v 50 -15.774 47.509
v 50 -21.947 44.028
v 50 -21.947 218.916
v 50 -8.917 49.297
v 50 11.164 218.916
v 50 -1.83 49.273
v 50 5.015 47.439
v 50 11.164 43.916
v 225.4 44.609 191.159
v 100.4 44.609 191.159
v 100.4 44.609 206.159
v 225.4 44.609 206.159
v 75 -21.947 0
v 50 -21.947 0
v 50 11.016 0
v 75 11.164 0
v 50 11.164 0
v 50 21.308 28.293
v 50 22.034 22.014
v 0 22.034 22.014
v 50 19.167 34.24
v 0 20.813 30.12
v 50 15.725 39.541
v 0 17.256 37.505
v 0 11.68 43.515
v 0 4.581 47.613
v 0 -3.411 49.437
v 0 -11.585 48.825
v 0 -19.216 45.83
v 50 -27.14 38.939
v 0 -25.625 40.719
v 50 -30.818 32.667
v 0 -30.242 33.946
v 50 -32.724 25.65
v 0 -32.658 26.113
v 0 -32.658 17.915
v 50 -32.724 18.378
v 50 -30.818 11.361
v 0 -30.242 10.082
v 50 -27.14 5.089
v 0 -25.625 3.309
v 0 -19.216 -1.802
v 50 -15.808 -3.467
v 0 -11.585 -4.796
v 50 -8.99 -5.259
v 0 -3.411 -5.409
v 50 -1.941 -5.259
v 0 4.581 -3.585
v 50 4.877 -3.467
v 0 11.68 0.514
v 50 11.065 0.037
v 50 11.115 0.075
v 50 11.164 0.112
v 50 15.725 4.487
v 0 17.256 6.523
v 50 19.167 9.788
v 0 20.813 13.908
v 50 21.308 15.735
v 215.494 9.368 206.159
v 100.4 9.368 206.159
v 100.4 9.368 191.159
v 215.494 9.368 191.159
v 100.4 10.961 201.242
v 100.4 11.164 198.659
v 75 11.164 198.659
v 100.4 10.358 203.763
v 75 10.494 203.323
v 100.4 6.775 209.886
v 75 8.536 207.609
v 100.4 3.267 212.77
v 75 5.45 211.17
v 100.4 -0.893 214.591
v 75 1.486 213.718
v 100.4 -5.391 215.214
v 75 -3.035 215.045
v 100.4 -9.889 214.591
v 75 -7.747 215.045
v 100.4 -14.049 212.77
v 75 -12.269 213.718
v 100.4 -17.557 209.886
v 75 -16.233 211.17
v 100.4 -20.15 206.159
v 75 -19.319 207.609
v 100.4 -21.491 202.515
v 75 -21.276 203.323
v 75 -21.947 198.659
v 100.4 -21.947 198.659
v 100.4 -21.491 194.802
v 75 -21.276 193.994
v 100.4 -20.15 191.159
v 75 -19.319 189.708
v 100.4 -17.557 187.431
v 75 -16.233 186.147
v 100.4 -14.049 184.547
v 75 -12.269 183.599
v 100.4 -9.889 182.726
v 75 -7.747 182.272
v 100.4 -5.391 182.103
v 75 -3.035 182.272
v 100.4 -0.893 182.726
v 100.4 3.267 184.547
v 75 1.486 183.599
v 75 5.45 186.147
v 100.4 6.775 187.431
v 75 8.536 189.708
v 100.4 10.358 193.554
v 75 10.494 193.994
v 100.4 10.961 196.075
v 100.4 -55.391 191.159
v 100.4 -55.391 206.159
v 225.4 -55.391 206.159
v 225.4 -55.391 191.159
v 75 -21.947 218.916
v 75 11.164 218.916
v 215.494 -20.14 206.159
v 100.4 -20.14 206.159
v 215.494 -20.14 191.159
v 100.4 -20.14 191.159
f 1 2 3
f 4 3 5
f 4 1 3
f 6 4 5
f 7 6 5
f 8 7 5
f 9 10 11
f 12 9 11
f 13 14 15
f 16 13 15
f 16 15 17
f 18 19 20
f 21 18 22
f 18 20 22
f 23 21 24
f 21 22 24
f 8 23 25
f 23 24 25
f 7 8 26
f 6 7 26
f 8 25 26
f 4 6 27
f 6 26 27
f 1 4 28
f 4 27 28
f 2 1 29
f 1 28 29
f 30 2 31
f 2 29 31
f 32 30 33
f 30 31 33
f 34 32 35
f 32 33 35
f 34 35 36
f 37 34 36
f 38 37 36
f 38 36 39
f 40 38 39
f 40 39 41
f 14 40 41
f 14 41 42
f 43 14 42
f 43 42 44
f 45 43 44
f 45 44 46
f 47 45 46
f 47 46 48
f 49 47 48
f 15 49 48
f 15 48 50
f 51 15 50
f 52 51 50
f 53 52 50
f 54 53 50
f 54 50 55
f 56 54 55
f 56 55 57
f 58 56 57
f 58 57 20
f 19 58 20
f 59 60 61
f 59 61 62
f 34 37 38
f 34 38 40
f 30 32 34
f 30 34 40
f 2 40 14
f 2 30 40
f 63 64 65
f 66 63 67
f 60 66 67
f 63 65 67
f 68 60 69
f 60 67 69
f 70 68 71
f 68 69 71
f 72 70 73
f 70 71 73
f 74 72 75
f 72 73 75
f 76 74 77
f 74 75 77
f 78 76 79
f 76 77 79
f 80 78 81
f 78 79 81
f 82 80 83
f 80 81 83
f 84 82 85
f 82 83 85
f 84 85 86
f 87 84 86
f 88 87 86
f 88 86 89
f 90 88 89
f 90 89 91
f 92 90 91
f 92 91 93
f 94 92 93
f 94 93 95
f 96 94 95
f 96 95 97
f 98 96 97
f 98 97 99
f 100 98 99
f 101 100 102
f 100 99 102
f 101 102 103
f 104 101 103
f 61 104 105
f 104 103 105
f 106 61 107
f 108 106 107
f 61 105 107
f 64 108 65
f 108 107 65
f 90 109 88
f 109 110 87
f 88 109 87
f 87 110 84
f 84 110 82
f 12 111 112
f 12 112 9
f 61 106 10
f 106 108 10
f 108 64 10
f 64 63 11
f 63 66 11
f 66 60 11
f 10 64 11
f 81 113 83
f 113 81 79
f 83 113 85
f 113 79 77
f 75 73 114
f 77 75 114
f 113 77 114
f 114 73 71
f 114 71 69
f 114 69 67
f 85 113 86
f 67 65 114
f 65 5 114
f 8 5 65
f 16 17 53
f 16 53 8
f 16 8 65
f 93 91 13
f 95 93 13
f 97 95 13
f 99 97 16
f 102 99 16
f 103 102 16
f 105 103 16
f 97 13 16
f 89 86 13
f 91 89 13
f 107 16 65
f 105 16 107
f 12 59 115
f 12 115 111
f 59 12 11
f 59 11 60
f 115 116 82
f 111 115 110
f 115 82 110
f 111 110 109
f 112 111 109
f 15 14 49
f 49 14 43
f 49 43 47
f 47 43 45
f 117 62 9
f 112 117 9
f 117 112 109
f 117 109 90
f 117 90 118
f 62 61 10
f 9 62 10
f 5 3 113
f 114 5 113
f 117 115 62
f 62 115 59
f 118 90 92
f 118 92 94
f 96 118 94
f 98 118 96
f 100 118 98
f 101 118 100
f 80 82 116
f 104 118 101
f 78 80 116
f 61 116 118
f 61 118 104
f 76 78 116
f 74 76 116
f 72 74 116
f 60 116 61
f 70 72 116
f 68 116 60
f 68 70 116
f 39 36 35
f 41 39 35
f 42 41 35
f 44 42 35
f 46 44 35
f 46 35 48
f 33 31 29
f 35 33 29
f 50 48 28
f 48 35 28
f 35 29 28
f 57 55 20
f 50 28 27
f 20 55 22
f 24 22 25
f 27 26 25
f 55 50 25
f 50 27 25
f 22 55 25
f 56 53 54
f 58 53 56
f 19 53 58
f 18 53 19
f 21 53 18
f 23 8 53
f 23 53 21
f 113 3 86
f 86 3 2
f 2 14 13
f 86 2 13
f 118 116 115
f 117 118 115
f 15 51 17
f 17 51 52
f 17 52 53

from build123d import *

# Parameters (mm, degrees)
F0_R      = 27.5
F1_DEPTH  = 50
F3_DEPTH  = 25
F4_W      = 25
F4_H      = 33.110834
F5_DEPTH  = 175
F7_DEPTH  = 25.4
F9_DEPTH  = 125
F10_W     = 115.094
F10_H     = 29.507754
F11_DEPTH = 25.4


with BuildPart() as f1:
    # F0 (on Right) → F1 (new body)
    with BuildSketch(Plane.YZ):
        with Locations((-5.465579, 22.014137)):
            Circle(F0_R)
    extrude(amount=F1_DEPTH)

    # F2 (on face) → F3 (join)
    with BuildSketch(Plane.YZ.offset(50)):
        with BuildLine():
            ThreePointArc((11.164121, 0.112013), (11.089932, 0.055881), (11.015554, 0))
            Line((11.015554, 0), (11.164121, 0))
            Line((11.164121, 0), (11.164121, 0.112013))
        make_face()
        with BuildLine():
            Line((-21.946713, 43.916262), (-21.946713, 0))
            Line((-21.946713, 0), (11.015554, 0))
            ThreePointArc((11.015554, 0), (11.089932, 0.055881), (11.164121, 0.112013))
            Line((11.164121, 0.112013), (11.164121, 43.916262))
            Line((11.164121, 43.916262), (-21.946713, 43.916262))
        make_face()
    extrude(amount=F3_DEPTH)

    # F4 (on face) → F5 (join)
    with BuildSketch(Plane.XY.offset(43.916262)):
        with Locations((62.5, -5.391296)):
            Rectangle(F4_W, F4_H)
    extrude(amount=F5_DEPTH)

    # F6 (on face) → F7 (join)
    with BuildSketch(Plane.YZ.offset(75)):
        with BuildLine():
            ThreePointArc((-21.946713, 198.658526), (-5.391296, 182.103109), (11.164121, 198.658526))
            ThreePointArc((11.164121, 198.658526), (-5.391296, 215.213943), (-21.946713, 198.658526))
        make_face()
    extrude(amount=F7_DEPTH)

    # F8 (on face) → F9 (join)
    with BuildSketch(Plane.YZ.offset(100.4)):
        with BuildLine():
            Line((-20.150423, 206.158526), (-55.391296, 206.158526))
            Line((-55.391296, 206.158526), (-55.391296, 191.158526))
            Line((-55.391296, 191.158526), (-20.150423, 191.158526))
            ThreePointArc((-20.150423, 191.158526), (-21.946713, 198.658526), (-20.150423, 206.158526))
        make_face()
        with BuildLine():
            Line((44.608704, 206.158526), (9.367831, 206.158526))
            ThreePointArc((9.367831, 206.158526), (10.708787, 202.514581), (11.164121, 198.658526))
            ThreePointArc((11.164121, 198.658526), (10.708787, 194.80247), (9.367831, 191.158526))
            Line((9.367831, 191.158526), (44.608704, 191.158526))
            Line((44.608704, 191.158526), (44.608704, 206.158526))
        make_face()
        with BuildLine():
            Line((9.367831, 206.158526), (-20.150423, 206.158526))
            ThreePointArc((-20.150423, 206.158526), (-21.946713, 198.658526), (-20.150423, 191.158526))
            Line((-20.150423, 191.158526), (9.367831, 191.158526))
            ThreePointArc((9.367831, 191.158526), (10.708787, 194.80247), (11.164121, 198.658526))
            ThreePointArc((11.164121, 198.658526), (10.708787, 202.514581), (9.367831, 206.158526))
        make_face()
    extrude(amount=F9_DEPTH)

    # F10 (on face) → F11 (cut)
    with BuildSketch(Plane.XY.offset(206.158526)):
        with Locations((157.947, -5.386046)):
            Rectangle(F10_W, F10_H)
    extrude(amount=-F11_DEPTH, mode=Mode.SUBTRACT)


solid = f1.part
